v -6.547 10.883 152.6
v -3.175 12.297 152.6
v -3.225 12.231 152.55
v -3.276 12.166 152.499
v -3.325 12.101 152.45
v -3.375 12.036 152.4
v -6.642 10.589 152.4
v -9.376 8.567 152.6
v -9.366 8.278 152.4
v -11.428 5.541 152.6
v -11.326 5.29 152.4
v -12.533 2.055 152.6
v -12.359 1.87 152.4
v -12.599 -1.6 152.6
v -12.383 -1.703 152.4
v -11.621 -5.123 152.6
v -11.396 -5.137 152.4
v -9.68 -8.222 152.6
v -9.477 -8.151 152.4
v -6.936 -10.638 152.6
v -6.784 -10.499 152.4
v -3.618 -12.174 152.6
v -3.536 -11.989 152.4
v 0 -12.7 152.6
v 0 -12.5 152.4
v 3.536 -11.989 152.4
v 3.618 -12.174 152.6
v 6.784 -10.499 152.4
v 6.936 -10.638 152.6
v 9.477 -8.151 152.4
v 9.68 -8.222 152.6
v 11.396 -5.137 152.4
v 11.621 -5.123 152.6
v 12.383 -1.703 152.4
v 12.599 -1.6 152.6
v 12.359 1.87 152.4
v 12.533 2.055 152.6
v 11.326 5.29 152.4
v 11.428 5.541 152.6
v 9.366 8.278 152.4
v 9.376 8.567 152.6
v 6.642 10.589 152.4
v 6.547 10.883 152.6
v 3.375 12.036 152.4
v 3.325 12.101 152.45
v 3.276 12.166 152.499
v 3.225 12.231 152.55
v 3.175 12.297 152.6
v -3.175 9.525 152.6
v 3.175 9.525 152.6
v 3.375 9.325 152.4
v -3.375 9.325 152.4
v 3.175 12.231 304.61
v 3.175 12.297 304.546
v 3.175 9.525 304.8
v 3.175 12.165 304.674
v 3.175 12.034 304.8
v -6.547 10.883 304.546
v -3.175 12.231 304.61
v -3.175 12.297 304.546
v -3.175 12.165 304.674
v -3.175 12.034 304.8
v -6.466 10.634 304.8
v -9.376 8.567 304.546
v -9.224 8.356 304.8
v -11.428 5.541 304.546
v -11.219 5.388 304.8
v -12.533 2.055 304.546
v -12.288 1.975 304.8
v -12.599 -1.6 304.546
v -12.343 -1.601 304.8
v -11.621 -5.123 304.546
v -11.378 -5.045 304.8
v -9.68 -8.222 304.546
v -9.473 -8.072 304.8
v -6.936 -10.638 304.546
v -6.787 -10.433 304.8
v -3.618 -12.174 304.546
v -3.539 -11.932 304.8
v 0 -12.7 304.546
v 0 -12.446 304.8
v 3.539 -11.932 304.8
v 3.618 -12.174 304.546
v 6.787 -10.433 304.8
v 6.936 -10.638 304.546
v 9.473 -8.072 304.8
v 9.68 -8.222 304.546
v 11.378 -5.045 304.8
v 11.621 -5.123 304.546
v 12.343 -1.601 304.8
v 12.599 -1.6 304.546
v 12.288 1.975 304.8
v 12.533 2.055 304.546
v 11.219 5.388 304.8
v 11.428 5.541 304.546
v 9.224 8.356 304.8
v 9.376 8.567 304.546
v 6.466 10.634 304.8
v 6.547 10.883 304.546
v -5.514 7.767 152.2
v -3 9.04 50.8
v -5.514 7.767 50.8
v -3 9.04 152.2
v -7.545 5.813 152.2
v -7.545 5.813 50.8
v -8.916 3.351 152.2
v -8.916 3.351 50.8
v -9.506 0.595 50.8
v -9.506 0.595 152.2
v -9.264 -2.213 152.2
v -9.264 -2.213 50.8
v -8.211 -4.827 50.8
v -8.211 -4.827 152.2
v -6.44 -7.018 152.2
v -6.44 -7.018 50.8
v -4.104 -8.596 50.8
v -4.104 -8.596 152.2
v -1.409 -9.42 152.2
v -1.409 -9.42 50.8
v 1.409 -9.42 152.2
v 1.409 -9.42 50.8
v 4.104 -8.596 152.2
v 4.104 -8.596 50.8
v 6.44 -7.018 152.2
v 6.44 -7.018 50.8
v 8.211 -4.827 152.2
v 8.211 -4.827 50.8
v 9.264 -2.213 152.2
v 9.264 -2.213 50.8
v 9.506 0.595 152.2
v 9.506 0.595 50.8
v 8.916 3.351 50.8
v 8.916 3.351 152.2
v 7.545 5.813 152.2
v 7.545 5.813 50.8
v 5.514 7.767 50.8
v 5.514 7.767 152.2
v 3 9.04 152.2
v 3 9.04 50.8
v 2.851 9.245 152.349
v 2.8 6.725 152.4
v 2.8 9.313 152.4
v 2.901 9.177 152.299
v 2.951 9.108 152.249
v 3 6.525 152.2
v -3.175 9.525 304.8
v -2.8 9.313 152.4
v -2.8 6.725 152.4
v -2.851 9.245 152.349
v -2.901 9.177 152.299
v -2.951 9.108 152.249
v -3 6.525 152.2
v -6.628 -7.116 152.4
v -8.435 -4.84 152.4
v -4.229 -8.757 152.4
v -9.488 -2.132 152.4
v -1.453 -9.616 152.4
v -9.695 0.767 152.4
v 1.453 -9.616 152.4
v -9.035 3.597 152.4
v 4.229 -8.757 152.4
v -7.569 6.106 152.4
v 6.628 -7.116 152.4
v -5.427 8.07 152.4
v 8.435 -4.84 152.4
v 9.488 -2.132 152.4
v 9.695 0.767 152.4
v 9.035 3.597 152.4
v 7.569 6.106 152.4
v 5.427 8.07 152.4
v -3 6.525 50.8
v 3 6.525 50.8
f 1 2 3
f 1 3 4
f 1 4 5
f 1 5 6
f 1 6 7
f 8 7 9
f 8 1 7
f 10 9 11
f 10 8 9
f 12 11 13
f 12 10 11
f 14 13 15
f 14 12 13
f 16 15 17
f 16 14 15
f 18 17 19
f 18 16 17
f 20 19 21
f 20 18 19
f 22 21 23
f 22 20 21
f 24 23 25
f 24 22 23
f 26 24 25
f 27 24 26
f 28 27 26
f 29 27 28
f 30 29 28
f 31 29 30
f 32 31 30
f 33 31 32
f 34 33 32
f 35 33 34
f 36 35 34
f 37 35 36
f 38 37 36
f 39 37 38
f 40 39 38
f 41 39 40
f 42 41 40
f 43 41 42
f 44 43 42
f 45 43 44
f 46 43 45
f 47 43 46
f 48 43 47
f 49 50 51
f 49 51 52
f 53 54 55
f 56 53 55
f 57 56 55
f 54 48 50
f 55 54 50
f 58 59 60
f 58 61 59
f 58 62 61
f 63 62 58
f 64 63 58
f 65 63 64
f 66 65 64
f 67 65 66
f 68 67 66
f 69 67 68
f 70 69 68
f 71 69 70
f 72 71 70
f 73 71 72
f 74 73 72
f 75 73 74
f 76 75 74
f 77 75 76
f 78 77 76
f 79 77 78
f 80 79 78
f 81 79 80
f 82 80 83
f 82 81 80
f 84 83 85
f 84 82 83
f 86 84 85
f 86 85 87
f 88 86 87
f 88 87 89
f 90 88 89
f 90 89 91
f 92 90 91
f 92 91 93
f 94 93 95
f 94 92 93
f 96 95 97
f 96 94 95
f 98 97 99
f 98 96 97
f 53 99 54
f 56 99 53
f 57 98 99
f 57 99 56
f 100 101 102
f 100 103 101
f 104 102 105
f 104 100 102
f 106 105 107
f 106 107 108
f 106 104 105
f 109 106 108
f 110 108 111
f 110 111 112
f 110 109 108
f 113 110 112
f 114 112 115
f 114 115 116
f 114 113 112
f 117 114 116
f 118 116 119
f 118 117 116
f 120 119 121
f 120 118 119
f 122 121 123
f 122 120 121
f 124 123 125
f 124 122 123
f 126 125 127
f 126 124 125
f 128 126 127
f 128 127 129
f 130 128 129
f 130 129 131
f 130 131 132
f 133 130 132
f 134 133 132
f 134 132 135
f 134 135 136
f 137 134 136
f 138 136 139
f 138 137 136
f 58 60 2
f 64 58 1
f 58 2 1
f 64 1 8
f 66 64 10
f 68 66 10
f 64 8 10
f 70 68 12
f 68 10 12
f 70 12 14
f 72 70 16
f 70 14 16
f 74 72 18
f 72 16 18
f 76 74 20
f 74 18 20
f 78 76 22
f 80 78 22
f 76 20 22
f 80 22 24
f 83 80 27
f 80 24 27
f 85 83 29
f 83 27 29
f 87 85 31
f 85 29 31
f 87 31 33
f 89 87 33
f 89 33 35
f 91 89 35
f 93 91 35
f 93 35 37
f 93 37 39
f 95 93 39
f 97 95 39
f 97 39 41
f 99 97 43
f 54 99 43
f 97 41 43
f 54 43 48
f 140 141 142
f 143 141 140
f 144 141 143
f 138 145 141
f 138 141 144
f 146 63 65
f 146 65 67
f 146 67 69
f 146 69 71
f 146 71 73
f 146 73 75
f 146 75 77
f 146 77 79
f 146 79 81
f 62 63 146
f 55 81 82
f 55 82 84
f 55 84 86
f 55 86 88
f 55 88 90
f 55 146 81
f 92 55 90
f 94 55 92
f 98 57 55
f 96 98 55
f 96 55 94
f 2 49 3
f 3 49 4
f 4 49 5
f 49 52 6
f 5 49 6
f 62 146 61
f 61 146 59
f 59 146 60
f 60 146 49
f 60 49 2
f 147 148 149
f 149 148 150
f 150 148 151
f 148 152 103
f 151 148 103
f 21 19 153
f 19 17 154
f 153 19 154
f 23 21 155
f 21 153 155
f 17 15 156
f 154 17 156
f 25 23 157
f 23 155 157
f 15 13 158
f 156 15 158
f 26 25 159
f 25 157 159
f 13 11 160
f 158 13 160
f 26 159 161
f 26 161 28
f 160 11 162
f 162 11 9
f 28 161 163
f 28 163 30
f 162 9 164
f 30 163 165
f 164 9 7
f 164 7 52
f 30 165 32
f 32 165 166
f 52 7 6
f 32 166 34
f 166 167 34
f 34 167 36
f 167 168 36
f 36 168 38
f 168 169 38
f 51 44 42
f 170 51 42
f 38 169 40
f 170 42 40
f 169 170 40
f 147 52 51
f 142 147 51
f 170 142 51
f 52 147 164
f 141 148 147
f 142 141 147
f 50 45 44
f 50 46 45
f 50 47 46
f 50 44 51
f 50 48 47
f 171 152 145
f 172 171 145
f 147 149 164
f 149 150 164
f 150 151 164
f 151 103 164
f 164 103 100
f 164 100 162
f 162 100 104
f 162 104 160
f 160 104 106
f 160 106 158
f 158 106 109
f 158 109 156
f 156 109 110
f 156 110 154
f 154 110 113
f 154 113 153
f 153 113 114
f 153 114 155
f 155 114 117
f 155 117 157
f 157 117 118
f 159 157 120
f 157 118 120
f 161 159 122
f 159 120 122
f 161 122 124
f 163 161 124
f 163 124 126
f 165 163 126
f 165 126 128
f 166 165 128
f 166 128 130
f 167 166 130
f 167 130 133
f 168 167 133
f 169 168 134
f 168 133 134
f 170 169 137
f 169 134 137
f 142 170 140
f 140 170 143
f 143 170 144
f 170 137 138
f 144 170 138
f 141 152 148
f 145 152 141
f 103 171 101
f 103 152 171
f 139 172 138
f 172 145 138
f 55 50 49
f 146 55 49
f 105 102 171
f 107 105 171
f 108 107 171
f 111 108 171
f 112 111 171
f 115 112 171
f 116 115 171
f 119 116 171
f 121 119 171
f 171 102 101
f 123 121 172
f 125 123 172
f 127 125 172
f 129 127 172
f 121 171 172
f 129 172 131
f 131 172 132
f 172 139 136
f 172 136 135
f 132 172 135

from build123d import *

# Parameters (mm, degrees)
BOSS_EXTRUDE1_DEPTH      = 304.8
BOSS_EXTRUDE1_DEPTH_BACK = 304.8
CHAMFER1_SIZE            = 0.254
SKETCH5_R                = 12.7
SKETCH5_R_2              = 9.525
CUT_EXTRUDE1_DEPTH       = 458.55264178
SKETCH6_W                = 6
SKETCH6_H                = 6
CUT_EXTRUDE2_DEPTH       = 458.55264178
CHAMFER2_SIZE            = 0.2
SKETCH7_R                = 63.5
CUT_EXTRUDE3_DEPTH       = 357.053282529


with BuildPart() as part:
    # Sketch3 → Boss-Extrude1 (new, two sides: drawn at the far end of the back side and taken through both)
    with BuildSketch(Plane.XY.offset(-BOSS_EXTRUDE1_DEPTH_BACK)):
        with BuildLine():
            Line((-3.175, 9.525), (-3.175, 12.296722124))
            ThreePointArc((-3.175, 12.296722124), (0, -12.7), (3.175, 12.296722124))
            Line((3.175, 12.296722124), (3.175, 9.525))
            Line((3.175, 9.525), (-3.175, 9.525))
        make_face()
    extrude(amount=BOSS_EXTRUDE1_DEPTH + BOSS_EXTRUDE1_DEPTH_BACK)

    # Chamfer1
    chamfer1_edges = [part.edges().sort_by_distance(p)[0] for p in [
        (0, -12.7, -304.8),
        (0, -12.7, 304.8),
    ]]
    chamfer(chamfer1_edges, length=CHAMFER1_SIZE)

    # Sketch5 → Cut-Extrude1 (cut, through all)
    with BuildSketch(Plane.XY.offset(152.4)):
        Circle(SKETCH5_R)
        Circle(SKETCH5_R_2, mode=Mode.SUBTRACT)
    extrude(amount=-CUT_EXTRUDE1_DEPTH, mode=Mode.SUBTRACT)

    # Sketch6 → Cut-Extrude2 (cut, through all)
    with BuildSketch(Plane.XY.offset(152.4)):
        with Locations((0, 9.525)):
            Rectangle(SKETCH6_W, SKETCH6_H)
    extrude(amount=-CUT_EXTRUDE2_DEPTH, mode=Mode.SUBTRACT)

    # Chamfer2
    chamfer2_edges = [part.edges().sort_by_distance(p)[0] for p in [
        (-3.175, 10.910861062, 152.4),
        (0, -12.7, 152.4),
        (3.175, 10.910861062, 152.4),
        (0, 9.525, 152.4),
        (0, -9.525, 152.4),
        (-3, 7.782611309, 152.4),
        (0, 6.525, 152.4),
        (3, 7.782611309, 152.4),
    ]]
    chamfer(chamfer2_edges, length=CHAMFER2_SIZE)

    # Sketch7 → Cut-Extrude3 (cut, through all)
    with BuildSketch(Plane.XY.offset(50.8)):
        Circle(SKETCH7_R)
    extrude(amount=-CUT_EXTRUDE3_DEPTH, mode=Mode.SUBTRACT)


solid = part.part
